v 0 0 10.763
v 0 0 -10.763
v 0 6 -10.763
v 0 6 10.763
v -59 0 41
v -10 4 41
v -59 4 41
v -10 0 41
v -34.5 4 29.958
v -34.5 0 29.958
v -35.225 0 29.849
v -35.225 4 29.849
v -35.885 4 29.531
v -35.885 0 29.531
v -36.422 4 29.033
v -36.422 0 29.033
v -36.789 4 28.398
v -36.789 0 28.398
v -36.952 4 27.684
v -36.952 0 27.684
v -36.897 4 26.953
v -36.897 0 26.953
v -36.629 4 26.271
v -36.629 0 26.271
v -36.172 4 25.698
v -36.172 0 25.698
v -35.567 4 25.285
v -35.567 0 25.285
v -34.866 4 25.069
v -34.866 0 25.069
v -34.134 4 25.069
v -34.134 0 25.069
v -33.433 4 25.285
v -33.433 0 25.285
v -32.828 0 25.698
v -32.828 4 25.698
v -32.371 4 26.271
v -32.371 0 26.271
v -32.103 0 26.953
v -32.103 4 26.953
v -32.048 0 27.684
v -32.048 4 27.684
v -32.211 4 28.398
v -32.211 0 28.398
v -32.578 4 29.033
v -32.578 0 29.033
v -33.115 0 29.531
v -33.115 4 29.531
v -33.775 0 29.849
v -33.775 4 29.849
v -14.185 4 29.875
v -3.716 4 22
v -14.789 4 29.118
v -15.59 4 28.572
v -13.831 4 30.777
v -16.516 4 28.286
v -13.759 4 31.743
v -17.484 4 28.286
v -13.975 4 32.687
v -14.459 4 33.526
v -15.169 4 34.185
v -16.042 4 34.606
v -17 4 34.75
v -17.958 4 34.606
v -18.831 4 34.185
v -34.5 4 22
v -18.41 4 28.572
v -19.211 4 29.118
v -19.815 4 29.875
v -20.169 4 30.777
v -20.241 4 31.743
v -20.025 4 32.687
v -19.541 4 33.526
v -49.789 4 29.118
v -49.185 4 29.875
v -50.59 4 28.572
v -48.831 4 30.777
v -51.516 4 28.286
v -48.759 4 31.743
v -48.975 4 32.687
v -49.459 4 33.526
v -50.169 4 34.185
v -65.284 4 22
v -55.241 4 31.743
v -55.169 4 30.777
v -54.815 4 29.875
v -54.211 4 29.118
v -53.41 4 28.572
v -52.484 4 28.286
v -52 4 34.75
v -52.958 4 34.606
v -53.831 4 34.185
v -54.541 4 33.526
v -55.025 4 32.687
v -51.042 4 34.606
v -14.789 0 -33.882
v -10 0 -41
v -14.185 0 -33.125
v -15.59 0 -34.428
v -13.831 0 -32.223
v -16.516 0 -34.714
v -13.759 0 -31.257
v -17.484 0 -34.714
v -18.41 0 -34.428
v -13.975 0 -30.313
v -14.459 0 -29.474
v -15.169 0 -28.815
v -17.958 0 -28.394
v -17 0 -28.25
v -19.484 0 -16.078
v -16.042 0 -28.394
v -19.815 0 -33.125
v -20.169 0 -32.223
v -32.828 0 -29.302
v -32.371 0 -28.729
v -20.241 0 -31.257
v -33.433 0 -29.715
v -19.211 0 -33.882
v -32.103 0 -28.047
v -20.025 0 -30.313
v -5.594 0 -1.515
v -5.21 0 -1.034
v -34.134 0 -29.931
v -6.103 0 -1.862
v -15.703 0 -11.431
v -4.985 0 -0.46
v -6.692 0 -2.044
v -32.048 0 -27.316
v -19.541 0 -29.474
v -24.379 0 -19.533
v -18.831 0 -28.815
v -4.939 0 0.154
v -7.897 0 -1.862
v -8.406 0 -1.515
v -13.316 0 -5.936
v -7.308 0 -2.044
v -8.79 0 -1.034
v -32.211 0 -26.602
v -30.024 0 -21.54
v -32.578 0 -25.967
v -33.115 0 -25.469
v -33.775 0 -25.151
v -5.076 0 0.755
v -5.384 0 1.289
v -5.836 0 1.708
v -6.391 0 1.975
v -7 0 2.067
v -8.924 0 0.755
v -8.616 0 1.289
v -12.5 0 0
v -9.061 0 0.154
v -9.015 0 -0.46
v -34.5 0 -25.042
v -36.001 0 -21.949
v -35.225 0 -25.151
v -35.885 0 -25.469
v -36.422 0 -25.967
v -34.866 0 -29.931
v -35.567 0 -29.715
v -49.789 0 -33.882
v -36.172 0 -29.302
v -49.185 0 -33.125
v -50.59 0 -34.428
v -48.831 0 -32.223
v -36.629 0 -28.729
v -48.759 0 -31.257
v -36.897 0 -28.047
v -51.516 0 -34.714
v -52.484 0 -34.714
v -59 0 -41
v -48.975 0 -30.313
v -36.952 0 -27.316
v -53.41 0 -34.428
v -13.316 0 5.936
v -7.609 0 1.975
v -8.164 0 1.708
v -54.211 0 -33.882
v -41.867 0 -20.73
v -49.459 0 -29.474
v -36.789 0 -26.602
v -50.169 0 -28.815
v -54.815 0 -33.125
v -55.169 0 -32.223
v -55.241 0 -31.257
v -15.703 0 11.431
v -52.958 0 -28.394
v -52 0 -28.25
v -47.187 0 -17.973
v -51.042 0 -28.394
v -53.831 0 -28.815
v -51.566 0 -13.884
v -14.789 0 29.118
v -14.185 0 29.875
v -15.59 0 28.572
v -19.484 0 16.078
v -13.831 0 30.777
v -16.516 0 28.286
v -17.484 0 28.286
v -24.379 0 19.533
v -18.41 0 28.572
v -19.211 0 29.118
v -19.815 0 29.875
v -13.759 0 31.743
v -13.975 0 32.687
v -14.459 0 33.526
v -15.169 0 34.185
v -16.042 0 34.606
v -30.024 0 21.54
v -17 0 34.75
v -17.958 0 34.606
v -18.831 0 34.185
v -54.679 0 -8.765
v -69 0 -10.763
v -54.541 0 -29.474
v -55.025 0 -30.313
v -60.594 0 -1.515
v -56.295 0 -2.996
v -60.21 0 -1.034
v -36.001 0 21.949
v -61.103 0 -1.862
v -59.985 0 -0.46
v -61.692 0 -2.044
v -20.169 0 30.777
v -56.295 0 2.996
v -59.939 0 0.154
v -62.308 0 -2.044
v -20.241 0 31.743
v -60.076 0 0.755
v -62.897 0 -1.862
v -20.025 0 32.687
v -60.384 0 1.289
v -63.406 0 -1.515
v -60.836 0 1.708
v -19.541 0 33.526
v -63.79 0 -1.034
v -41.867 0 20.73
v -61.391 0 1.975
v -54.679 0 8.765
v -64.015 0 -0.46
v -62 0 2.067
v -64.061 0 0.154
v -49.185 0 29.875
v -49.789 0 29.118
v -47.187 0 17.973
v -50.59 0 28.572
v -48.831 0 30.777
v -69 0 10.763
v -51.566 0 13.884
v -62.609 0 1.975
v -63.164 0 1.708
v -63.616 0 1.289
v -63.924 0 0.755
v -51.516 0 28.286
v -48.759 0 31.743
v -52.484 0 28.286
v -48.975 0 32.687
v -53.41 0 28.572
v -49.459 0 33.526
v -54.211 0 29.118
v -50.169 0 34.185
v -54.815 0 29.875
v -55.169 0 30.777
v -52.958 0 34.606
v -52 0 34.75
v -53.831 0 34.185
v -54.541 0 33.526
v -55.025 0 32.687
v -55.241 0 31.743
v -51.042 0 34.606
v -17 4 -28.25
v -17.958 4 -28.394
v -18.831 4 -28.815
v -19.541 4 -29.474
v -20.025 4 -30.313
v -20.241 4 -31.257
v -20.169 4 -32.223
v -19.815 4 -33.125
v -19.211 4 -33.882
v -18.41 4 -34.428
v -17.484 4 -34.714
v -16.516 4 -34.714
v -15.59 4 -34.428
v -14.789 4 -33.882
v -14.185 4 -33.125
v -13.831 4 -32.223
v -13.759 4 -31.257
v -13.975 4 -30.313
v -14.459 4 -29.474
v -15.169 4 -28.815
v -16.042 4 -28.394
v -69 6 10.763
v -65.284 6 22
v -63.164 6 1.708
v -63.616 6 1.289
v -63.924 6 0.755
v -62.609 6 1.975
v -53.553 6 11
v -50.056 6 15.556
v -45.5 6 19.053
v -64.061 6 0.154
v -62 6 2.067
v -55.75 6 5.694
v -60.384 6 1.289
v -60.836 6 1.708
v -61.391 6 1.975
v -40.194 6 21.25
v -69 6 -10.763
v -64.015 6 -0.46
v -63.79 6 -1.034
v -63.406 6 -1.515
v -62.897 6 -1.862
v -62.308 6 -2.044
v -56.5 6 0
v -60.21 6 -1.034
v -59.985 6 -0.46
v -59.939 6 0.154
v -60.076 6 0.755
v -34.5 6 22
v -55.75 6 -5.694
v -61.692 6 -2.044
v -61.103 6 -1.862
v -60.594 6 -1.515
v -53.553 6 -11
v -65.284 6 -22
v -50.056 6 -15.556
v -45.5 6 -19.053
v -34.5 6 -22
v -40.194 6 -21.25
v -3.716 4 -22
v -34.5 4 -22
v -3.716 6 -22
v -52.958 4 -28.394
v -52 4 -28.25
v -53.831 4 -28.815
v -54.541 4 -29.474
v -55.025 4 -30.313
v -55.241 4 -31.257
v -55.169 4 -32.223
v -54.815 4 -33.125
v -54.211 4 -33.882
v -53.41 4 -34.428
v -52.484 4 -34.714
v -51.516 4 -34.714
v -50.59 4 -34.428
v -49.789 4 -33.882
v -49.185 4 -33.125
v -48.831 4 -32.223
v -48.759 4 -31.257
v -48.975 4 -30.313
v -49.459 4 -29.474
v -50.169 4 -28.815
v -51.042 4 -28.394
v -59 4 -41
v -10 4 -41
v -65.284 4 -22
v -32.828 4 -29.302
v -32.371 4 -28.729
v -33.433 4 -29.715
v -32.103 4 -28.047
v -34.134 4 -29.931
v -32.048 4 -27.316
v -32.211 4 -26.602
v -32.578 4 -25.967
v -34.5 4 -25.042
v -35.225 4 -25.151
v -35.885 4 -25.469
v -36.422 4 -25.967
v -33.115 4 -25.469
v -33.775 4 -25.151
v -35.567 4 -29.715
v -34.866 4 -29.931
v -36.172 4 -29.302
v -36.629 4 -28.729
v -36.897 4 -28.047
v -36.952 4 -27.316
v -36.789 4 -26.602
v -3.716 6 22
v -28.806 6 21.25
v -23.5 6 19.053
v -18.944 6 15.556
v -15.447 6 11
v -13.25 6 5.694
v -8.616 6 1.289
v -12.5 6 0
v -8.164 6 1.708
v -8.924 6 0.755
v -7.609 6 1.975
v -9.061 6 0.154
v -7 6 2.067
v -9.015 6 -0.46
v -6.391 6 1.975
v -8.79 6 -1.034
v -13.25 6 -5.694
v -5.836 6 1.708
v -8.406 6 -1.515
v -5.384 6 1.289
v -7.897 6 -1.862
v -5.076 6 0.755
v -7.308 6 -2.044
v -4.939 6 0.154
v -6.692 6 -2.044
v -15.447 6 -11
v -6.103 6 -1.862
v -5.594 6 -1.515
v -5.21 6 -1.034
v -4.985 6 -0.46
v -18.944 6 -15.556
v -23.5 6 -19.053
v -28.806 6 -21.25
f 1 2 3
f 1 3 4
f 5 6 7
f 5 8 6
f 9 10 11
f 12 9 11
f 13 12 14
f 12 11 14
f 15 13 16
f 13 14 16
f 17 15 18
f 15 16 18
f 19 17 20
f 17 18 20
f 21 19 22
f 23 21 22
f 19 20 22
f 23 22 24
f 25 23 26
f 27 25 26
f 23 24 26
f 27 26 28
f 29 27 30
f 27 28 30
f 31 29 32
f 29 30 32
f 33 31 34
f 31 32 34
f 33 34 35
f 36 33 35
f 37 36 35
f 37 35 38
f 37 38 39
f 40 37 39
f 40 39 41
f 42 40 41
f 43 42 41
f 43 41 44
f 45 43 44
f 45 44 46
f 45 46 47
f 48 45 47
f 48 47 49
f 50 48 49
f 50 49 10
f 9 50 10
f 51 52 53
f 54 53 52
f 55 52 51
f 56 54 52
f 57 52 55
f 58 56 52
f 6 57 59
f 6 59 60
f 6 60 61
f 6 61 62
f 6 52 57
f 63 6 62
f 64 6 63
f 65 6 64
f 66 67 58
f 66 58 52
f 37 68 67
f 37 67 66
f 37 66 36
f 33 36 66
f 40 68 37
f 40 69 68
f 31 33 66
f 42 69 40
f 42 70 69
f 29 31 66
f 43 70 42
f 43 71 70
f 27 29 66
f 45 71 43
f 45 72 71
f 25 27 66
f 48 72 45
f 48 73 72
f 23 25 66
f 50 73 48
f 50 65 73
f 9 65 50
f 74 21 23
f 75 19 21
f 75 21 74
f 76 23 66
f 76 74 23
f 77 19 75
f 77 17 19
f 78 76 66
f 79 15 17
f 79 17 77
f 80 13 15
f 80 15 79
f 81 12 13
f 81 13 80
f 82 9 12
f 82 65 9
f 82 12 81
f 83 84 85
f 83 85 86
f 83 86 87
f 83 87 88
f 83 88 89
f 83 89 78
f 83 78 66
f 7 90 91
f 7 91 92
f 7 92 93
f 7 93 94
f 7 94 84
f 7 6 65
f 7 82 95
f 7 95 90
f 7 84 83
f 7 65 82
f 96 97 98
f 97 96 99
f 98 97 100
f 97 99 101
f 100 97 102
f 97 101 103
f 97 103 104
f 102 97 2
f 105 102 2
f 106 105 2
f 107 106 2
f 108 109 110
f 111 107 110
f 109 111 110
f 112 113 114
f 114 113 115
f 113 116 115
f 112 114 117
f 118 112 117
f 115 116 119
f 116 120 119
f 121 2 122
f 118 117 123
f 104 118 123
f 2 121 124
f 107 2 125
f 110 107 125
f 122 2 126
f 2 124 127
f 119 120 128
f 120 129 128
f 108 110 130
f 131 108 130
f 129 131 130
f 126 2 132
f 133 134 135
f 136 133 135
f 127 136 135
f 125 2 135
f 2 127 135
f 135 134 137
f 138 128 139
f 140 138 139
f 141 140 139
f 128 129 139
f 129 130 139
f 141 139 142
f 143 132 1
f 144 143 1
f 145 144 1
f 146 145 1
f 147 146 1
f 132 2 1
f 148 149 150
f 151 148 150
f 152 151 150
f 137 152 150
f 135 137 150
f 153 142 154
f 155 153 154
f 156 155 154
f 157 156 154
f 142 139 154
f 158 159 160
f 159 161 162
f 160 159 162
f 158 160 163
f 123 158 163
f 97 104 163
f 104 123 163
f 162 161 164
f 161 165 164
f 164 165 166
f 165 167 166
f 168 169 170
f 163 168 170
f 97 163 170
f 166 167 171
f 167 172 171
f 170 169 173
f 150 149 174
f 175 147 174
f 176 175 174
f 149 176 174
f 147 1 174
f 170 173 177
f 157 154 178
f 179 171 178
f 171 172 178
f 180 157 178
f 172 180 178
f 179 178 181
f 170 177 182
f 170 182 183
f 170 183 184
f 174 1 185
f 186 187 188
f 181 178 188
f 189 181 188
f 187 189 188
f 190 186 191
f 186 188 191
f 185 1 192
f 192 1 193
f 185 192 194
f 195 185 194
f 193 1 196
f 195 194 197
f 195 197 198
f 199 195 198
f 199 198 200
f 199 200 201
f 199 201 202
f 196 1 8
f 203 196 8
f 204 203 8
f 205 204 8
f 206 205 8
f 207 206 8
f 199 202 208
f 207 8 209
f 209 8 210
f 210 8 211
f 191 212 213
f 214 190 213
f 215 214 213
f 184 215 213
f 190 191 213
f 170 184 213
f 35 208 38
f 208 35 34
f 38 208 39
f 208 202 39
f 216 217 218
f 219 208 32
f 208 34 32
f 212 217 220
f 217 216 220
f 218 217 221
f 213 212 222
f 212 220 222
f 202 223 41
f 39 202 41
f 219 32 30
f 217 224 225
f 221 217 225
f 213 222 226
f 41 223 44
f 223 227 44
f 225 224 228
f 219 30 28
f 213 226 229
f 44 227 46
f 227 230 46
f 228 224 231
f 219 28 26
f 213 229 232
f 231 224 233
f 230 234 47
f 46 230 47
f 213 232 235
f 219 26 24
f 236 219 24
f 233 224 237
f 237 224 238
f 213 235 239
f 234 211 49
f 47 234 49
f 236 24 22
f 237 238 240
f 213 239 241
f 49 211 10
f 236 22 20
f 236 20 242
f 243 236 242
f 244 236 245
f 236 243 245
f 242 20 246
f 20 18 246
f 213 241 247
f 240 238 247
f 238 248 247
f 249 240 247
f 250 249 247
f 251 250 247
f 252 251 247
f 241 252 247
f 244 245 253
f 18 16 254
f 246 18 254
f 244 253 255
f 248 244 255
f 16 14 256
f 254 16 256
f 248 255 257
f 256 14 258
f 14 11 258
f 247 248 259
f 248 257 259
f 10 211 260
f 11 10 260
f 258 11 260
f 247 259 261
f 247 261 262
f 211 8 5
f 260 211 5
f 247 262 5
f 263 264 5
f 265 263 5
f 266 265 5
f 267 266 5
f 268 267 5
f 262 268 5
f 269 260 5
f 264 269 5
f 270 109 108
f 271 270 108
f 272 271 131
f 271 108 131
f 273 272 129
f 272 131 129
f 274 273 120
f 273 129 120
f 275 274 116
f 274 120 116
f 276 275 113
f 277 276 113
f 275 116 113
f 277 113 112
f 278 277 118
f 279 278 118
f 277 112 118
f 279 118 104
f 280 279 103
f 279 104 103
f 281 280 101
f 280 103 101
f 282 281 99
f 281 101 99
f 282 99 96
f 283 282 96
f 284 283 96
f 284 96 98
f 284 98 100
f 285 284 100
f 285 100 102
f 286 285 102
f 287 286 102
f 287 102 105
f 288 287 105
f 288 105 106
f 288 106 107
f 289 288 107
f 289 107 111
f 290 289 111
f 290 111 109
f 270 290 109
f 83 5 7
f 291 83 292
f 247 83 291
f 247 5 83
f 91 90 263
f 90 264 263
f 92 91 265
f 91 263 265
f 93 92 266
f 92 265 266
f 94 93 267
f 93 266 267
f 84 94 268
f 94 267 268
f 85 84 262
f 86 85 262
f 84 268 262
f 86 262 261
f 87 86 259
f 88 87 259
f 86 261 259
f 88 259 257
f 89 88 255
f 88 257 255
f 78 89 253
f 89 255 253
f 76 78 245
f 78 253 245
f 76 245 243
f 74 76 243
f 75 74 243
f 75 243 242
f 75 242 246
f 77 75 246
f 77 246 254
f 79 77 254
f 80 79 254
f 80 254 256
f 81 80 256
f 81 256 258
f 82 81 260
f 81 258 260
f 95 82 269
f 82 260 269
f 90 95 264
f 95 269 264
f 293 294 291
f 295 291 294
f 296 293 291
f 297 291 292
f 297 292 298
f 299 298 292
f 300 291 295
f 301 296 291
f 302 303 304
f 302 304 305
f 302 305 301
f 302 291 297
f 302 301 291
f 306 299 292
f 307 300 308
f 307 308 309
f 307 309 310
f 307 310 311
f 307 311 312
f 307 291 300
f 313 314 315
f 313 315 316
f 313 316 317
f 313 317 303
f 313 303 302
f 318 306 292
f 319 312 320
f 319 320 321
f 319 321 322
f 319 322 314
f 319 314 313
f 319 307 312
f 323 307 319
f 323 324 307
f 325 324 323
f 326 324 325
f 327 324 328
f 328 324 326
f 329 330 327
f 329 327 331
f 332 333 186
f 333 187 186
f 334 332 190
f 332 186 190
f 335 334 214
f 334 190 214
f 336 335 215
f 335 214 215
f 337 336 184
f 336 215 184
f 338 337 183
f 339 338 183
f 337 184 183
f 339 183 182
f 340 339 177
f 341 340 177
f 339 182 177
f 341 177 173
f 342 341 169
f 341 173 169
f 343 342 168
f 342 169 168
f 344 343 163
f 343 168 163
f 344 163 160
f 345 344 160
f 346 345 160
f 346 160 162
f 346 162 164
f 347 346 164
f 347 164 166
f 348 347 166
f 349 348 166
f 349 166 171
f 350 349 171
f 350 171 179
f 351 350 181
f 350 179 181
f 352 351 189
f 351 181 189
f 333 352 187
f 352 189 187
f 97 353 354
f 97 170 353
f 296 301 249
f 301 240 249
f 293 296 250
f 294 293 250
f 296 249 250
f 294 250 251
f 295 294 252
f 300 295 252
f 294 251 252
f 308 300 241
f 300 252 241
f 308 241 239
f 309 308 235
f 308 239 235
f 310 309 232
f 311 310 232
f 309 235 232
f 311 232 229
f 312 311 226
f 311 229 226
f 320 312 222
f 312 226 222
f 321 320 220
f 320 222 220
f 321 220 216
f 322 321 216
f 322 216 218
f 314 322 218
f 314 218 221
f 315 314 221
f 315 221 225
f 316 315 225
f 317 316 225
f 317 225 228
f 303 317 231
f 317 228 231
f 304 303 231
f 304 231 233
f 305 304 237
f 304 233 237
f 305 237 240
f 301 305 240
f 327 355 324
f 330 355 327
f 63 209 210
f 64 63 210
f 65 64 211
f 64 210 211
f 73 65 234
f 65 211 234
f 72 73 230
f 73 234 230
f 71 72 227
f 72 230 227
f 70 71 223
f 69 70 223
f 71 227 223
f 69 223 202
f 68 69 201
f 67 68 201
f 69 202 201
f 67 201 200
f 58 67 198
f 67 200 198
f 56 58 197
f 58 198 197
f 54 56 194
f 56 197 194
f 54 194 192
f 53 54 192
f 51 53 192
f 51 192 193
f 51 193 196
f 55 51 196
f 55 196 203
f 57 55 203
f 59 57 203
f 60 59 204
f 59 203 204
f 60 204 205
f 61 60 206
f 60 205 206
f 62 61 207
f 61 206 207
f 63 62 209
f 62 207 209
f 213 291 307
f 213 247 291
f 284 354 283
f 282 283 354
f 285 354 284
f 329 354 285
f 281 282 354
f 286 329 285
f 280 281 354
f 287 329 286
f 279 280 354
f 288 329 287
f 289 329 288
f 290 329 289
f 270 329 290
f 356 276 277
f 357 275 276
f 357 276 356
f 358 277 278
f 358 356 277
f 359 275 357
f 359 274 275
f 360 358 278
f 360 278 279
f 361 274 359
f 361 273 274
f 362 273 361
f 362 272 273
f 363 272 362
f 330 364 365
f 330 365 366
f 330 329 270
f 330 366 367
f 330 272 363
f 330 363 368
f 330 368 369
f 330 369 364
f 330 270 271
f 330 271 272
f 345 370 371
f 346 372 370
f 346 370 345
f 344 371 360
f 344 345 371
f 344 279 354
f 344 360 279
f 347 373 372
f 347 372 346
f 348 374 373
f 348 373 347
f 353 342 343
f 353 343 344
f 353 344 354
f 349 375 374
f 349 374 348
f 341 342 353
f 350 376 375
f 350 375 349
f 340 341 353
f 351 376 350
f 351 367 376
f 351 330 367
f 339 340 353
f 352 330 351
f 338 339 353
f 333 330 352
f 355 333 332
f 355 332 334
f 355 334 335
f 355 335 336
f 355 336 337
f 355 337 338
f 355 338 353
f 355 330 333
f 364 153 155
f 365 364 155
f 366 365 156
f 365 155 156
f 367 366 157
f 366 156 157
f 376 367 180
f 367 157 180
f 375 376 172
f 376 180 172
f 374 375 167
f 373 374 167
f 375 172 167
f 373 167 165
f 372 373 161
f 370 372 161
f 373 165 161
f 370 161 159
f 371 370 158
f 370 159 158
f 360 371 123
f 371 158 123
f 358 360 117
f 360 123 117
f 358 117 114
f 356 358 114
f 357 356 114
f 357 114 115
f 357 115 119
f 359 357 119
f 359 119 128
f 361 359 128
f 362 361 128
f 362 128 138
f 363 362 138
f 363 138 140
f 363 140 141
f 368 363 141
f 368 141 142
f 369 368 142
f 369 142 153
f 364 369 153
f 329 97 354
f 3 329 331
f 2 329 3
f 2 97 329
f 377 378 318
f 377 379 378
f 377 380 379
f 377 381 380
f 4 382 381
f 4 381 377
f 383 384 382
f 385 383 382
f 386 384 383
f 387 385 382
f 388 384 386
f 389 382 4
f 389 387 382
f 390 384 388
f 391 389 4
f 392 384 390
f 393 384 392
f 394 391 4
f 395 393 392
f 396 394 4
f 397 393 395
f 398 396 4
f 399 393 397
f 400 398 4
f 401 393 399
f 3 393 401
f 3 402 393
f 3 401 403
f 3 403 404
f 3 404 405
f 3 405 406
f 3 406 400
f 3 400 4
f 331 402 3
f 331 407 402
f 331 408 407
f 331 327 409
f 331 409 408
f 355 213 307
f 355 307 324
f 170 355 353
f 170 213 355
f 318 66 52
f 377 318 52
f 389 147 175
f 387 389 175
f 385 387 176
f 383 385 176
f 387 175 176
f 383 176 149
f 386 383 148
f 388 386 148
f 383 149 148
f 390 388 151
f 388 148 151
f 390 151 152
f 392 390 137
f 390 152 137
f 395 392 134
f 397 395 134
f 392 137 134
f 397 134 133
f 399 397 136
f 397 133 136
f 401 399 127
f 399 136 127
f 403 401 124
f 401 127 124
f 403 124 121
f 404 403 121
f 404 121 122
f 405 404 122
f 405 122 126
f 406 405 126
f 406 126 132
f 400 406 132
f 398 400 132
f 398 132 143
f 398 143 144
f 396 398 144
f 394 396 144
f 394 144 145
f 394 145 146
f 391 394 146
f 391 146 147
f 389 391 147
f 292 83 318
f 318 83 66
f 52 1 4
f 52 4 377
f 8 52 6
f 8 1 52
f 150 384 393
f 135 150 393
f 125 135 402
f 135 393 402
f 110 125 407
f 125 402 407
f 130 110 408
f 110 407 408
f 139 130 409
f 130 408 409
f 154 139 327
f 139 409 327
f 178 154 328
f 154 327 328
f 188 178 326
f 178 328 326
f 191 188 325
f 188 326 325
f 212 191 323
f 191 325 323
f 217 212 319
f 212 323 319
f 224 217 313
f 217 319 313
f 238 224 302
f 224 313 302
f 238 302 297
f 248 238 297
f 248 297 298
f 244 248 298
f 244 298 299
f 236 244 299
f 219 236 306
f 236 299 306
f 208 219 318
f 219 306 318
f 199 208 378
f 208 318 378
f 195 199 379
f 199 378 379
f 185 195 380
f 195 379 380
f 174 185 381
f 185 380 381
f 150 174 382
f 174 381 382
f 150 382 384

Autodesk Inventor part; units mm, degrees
ref_plane "YZ Plane" through (0, 0, 0) normal (1, 0, 0) x (0, 1, 0)
ref_plane "XZ Plane" through (0, 0, 0) normal (0, 1, 0) x (-1, 0, 0)
sketch "Skizze1" plane through (0, 0, 0) normal (0, 1, 0) x (-1, 0, 0)
  line L0 (0, 10.7628) -> (10, 41)
  line L1 (10, 41) -> (59, 41)
  line L2 (59, 41) -> (69, 10.7628)
  line L3 (69, 10.7628) -> (69, -10.7628)
  line L4 (69, -10.7628) -> (59, -41)
  line L5 (59, -41) -> (10, -41)
  line L6 (10, -41) -> (0, -10.7628)
  line L7 (0, -10.7628) -> (0, 10.7628)
  line L8 (34.5, 41) -> (34.5, -41) construction
  line L9 (0, 0) -> (92.3843, 0) construction
  dimension "d0" = 69
  dimension "d1" = 18.3
  dimension "d2" = 49
  dimension "d4" = 82
  dimension "d5" = 18.3
  dimension "d6" = 18.3
  dimension "d7" = 18.3
extrude "Extrusion1" add sketch "Skizze1" along normal blind 4
sketch "Skizze2" plane through (0, 4, 0) normal (0, 1, 0) x (1, 0, 0)
  line L0 (-69, -10.7628) -> (-59, -41) projected
  line L1 (-65.2836, -22) -> (-3.7164, -22)
  line L2 (-59, -41) -> (-10, -41) projected
  line L3 (-59, 41) -> (-69, 10.7628) projected
  line L4 (-65.2836, 22) -> (-3.7164, 22)
  line L5 (0, 10.7628) -> (-10, 41) projected
  line L6 (0, 0) -> (-69, 0) construction
  line L7 (-69, 10.7628) -> (-69, -10.7628) projected
  line L8 (0, -10.7628) -> (0, 10.7628) projected
  line L9 (-10, -41) -> (0, -10.7628) projected
  dimension "d10" = 44
extrude "Extrusion2" add sketch "Skizze2" along normal blind 2 contours L7 L3 L4 L5 L8 L9 L1 L0
sketch "Skizze3" plane through (0, 6, 0) normal (0, 1, 0) x (1, 0, 0)
  circle A0 centre (-34.5, 0) radius 22
  line L0 (0, -10.7628) -> (0, 10.7628) projected
  line L1 (-59, -41) -> (-10, -41) projected
  point P0 (0, 0)
  point P1 (0, 0)
  point P2 (-34.5, -41)
  dimension "d13" = 44
extrude "Extrusion3" cut sketch "Skizze3" against normal up to surface (6 mm away)
sketch "Skizze4" plane through (0, 4, 0) normal (0, 1, 0) x (1, 0, 0)
  line L0 (-10, 41) -> (-59, 41) projected
  line L1 (0, 0) -> (-69, 0) construction
  line L2 (-69, 10.7628) -> (-69, -10.7628) projected
  point P0 (-34.5, 27.5)
  point P1 (-34.5, -27.5)
  point P2 (-34.5, 41)
  dimension "d16" = 55
hole "Bohrung1" at (-34.5, 4, -27.5) at (-34.5, 4, 27.5) direction (0, -1, 0) diameter 4.917 end through all thread size "M6x1" class "6H" standard "ISO Metric profile"
sketch "Skizze5" plane through (0, 4, 0) normal (0, 1, 0) x (1, 0, 0)
  line L0 (-10, 41) -> (-59, 41) projected
  line L1 (-34.5, 41) -> (-34.5, 22) construction
  line L2 (0, 0) -> (-76.2503, 0) construction
  point P0 (-17, 31.5)
  point P1 (-52, 31.5)
  point P2 (-34.5, 31.5)
  point P3 (-17, -31.5)
  point P4 (-52, -31.5)
  dimension "d31" = 35
  dimension "d42" = 35
  dimension "d43" = 63
hole "Bohrung2" at (-17, 4, -31.5) at (-52, 4, -31.5) at (-17, 4, 31.5) at (-52, 4, 31.5) direction (0, -1, 0) diameter 6.5 end through all
sketch "Skizze6" plane through (0, 6, 0) normal (0, 1, 0) x (1, 0, 0)
  line L0 (0, -10.7628) -> (0, 10.7628) projected
  line L1 (-10, 41) -> (-59, 41) projected
  line L2 (-34.5, 41) -> (-34.5, -41) construction
  line L3 (-59, -41) -> (-10, -41) projected
  point P0 (0, 0)
  point P1 (-7, 0)
  point P2 (-62, 0)
  point P3 (0, 0)
  point P4 (0, 0)
  dimension "d33" = 55
hole "Bohrung3" at (-7, 6, 0) at (-62, 6, 0) direction (0, -1, 0) diameter 4.134 end through all thread size "M5x0.8" class "6H" standard "ISO Metric profile"
ref_plane "Arbeitsebene1" through (-10, 0, 0) normal (0, 0, -1) x (-1, 0, 0)
equation "\"d5\" = d1"
equation "\"d6\" = d1"
equation "\"d7\" = d6"
properties part number "HAlteplatte" material "Stahl, galvanisiert"
